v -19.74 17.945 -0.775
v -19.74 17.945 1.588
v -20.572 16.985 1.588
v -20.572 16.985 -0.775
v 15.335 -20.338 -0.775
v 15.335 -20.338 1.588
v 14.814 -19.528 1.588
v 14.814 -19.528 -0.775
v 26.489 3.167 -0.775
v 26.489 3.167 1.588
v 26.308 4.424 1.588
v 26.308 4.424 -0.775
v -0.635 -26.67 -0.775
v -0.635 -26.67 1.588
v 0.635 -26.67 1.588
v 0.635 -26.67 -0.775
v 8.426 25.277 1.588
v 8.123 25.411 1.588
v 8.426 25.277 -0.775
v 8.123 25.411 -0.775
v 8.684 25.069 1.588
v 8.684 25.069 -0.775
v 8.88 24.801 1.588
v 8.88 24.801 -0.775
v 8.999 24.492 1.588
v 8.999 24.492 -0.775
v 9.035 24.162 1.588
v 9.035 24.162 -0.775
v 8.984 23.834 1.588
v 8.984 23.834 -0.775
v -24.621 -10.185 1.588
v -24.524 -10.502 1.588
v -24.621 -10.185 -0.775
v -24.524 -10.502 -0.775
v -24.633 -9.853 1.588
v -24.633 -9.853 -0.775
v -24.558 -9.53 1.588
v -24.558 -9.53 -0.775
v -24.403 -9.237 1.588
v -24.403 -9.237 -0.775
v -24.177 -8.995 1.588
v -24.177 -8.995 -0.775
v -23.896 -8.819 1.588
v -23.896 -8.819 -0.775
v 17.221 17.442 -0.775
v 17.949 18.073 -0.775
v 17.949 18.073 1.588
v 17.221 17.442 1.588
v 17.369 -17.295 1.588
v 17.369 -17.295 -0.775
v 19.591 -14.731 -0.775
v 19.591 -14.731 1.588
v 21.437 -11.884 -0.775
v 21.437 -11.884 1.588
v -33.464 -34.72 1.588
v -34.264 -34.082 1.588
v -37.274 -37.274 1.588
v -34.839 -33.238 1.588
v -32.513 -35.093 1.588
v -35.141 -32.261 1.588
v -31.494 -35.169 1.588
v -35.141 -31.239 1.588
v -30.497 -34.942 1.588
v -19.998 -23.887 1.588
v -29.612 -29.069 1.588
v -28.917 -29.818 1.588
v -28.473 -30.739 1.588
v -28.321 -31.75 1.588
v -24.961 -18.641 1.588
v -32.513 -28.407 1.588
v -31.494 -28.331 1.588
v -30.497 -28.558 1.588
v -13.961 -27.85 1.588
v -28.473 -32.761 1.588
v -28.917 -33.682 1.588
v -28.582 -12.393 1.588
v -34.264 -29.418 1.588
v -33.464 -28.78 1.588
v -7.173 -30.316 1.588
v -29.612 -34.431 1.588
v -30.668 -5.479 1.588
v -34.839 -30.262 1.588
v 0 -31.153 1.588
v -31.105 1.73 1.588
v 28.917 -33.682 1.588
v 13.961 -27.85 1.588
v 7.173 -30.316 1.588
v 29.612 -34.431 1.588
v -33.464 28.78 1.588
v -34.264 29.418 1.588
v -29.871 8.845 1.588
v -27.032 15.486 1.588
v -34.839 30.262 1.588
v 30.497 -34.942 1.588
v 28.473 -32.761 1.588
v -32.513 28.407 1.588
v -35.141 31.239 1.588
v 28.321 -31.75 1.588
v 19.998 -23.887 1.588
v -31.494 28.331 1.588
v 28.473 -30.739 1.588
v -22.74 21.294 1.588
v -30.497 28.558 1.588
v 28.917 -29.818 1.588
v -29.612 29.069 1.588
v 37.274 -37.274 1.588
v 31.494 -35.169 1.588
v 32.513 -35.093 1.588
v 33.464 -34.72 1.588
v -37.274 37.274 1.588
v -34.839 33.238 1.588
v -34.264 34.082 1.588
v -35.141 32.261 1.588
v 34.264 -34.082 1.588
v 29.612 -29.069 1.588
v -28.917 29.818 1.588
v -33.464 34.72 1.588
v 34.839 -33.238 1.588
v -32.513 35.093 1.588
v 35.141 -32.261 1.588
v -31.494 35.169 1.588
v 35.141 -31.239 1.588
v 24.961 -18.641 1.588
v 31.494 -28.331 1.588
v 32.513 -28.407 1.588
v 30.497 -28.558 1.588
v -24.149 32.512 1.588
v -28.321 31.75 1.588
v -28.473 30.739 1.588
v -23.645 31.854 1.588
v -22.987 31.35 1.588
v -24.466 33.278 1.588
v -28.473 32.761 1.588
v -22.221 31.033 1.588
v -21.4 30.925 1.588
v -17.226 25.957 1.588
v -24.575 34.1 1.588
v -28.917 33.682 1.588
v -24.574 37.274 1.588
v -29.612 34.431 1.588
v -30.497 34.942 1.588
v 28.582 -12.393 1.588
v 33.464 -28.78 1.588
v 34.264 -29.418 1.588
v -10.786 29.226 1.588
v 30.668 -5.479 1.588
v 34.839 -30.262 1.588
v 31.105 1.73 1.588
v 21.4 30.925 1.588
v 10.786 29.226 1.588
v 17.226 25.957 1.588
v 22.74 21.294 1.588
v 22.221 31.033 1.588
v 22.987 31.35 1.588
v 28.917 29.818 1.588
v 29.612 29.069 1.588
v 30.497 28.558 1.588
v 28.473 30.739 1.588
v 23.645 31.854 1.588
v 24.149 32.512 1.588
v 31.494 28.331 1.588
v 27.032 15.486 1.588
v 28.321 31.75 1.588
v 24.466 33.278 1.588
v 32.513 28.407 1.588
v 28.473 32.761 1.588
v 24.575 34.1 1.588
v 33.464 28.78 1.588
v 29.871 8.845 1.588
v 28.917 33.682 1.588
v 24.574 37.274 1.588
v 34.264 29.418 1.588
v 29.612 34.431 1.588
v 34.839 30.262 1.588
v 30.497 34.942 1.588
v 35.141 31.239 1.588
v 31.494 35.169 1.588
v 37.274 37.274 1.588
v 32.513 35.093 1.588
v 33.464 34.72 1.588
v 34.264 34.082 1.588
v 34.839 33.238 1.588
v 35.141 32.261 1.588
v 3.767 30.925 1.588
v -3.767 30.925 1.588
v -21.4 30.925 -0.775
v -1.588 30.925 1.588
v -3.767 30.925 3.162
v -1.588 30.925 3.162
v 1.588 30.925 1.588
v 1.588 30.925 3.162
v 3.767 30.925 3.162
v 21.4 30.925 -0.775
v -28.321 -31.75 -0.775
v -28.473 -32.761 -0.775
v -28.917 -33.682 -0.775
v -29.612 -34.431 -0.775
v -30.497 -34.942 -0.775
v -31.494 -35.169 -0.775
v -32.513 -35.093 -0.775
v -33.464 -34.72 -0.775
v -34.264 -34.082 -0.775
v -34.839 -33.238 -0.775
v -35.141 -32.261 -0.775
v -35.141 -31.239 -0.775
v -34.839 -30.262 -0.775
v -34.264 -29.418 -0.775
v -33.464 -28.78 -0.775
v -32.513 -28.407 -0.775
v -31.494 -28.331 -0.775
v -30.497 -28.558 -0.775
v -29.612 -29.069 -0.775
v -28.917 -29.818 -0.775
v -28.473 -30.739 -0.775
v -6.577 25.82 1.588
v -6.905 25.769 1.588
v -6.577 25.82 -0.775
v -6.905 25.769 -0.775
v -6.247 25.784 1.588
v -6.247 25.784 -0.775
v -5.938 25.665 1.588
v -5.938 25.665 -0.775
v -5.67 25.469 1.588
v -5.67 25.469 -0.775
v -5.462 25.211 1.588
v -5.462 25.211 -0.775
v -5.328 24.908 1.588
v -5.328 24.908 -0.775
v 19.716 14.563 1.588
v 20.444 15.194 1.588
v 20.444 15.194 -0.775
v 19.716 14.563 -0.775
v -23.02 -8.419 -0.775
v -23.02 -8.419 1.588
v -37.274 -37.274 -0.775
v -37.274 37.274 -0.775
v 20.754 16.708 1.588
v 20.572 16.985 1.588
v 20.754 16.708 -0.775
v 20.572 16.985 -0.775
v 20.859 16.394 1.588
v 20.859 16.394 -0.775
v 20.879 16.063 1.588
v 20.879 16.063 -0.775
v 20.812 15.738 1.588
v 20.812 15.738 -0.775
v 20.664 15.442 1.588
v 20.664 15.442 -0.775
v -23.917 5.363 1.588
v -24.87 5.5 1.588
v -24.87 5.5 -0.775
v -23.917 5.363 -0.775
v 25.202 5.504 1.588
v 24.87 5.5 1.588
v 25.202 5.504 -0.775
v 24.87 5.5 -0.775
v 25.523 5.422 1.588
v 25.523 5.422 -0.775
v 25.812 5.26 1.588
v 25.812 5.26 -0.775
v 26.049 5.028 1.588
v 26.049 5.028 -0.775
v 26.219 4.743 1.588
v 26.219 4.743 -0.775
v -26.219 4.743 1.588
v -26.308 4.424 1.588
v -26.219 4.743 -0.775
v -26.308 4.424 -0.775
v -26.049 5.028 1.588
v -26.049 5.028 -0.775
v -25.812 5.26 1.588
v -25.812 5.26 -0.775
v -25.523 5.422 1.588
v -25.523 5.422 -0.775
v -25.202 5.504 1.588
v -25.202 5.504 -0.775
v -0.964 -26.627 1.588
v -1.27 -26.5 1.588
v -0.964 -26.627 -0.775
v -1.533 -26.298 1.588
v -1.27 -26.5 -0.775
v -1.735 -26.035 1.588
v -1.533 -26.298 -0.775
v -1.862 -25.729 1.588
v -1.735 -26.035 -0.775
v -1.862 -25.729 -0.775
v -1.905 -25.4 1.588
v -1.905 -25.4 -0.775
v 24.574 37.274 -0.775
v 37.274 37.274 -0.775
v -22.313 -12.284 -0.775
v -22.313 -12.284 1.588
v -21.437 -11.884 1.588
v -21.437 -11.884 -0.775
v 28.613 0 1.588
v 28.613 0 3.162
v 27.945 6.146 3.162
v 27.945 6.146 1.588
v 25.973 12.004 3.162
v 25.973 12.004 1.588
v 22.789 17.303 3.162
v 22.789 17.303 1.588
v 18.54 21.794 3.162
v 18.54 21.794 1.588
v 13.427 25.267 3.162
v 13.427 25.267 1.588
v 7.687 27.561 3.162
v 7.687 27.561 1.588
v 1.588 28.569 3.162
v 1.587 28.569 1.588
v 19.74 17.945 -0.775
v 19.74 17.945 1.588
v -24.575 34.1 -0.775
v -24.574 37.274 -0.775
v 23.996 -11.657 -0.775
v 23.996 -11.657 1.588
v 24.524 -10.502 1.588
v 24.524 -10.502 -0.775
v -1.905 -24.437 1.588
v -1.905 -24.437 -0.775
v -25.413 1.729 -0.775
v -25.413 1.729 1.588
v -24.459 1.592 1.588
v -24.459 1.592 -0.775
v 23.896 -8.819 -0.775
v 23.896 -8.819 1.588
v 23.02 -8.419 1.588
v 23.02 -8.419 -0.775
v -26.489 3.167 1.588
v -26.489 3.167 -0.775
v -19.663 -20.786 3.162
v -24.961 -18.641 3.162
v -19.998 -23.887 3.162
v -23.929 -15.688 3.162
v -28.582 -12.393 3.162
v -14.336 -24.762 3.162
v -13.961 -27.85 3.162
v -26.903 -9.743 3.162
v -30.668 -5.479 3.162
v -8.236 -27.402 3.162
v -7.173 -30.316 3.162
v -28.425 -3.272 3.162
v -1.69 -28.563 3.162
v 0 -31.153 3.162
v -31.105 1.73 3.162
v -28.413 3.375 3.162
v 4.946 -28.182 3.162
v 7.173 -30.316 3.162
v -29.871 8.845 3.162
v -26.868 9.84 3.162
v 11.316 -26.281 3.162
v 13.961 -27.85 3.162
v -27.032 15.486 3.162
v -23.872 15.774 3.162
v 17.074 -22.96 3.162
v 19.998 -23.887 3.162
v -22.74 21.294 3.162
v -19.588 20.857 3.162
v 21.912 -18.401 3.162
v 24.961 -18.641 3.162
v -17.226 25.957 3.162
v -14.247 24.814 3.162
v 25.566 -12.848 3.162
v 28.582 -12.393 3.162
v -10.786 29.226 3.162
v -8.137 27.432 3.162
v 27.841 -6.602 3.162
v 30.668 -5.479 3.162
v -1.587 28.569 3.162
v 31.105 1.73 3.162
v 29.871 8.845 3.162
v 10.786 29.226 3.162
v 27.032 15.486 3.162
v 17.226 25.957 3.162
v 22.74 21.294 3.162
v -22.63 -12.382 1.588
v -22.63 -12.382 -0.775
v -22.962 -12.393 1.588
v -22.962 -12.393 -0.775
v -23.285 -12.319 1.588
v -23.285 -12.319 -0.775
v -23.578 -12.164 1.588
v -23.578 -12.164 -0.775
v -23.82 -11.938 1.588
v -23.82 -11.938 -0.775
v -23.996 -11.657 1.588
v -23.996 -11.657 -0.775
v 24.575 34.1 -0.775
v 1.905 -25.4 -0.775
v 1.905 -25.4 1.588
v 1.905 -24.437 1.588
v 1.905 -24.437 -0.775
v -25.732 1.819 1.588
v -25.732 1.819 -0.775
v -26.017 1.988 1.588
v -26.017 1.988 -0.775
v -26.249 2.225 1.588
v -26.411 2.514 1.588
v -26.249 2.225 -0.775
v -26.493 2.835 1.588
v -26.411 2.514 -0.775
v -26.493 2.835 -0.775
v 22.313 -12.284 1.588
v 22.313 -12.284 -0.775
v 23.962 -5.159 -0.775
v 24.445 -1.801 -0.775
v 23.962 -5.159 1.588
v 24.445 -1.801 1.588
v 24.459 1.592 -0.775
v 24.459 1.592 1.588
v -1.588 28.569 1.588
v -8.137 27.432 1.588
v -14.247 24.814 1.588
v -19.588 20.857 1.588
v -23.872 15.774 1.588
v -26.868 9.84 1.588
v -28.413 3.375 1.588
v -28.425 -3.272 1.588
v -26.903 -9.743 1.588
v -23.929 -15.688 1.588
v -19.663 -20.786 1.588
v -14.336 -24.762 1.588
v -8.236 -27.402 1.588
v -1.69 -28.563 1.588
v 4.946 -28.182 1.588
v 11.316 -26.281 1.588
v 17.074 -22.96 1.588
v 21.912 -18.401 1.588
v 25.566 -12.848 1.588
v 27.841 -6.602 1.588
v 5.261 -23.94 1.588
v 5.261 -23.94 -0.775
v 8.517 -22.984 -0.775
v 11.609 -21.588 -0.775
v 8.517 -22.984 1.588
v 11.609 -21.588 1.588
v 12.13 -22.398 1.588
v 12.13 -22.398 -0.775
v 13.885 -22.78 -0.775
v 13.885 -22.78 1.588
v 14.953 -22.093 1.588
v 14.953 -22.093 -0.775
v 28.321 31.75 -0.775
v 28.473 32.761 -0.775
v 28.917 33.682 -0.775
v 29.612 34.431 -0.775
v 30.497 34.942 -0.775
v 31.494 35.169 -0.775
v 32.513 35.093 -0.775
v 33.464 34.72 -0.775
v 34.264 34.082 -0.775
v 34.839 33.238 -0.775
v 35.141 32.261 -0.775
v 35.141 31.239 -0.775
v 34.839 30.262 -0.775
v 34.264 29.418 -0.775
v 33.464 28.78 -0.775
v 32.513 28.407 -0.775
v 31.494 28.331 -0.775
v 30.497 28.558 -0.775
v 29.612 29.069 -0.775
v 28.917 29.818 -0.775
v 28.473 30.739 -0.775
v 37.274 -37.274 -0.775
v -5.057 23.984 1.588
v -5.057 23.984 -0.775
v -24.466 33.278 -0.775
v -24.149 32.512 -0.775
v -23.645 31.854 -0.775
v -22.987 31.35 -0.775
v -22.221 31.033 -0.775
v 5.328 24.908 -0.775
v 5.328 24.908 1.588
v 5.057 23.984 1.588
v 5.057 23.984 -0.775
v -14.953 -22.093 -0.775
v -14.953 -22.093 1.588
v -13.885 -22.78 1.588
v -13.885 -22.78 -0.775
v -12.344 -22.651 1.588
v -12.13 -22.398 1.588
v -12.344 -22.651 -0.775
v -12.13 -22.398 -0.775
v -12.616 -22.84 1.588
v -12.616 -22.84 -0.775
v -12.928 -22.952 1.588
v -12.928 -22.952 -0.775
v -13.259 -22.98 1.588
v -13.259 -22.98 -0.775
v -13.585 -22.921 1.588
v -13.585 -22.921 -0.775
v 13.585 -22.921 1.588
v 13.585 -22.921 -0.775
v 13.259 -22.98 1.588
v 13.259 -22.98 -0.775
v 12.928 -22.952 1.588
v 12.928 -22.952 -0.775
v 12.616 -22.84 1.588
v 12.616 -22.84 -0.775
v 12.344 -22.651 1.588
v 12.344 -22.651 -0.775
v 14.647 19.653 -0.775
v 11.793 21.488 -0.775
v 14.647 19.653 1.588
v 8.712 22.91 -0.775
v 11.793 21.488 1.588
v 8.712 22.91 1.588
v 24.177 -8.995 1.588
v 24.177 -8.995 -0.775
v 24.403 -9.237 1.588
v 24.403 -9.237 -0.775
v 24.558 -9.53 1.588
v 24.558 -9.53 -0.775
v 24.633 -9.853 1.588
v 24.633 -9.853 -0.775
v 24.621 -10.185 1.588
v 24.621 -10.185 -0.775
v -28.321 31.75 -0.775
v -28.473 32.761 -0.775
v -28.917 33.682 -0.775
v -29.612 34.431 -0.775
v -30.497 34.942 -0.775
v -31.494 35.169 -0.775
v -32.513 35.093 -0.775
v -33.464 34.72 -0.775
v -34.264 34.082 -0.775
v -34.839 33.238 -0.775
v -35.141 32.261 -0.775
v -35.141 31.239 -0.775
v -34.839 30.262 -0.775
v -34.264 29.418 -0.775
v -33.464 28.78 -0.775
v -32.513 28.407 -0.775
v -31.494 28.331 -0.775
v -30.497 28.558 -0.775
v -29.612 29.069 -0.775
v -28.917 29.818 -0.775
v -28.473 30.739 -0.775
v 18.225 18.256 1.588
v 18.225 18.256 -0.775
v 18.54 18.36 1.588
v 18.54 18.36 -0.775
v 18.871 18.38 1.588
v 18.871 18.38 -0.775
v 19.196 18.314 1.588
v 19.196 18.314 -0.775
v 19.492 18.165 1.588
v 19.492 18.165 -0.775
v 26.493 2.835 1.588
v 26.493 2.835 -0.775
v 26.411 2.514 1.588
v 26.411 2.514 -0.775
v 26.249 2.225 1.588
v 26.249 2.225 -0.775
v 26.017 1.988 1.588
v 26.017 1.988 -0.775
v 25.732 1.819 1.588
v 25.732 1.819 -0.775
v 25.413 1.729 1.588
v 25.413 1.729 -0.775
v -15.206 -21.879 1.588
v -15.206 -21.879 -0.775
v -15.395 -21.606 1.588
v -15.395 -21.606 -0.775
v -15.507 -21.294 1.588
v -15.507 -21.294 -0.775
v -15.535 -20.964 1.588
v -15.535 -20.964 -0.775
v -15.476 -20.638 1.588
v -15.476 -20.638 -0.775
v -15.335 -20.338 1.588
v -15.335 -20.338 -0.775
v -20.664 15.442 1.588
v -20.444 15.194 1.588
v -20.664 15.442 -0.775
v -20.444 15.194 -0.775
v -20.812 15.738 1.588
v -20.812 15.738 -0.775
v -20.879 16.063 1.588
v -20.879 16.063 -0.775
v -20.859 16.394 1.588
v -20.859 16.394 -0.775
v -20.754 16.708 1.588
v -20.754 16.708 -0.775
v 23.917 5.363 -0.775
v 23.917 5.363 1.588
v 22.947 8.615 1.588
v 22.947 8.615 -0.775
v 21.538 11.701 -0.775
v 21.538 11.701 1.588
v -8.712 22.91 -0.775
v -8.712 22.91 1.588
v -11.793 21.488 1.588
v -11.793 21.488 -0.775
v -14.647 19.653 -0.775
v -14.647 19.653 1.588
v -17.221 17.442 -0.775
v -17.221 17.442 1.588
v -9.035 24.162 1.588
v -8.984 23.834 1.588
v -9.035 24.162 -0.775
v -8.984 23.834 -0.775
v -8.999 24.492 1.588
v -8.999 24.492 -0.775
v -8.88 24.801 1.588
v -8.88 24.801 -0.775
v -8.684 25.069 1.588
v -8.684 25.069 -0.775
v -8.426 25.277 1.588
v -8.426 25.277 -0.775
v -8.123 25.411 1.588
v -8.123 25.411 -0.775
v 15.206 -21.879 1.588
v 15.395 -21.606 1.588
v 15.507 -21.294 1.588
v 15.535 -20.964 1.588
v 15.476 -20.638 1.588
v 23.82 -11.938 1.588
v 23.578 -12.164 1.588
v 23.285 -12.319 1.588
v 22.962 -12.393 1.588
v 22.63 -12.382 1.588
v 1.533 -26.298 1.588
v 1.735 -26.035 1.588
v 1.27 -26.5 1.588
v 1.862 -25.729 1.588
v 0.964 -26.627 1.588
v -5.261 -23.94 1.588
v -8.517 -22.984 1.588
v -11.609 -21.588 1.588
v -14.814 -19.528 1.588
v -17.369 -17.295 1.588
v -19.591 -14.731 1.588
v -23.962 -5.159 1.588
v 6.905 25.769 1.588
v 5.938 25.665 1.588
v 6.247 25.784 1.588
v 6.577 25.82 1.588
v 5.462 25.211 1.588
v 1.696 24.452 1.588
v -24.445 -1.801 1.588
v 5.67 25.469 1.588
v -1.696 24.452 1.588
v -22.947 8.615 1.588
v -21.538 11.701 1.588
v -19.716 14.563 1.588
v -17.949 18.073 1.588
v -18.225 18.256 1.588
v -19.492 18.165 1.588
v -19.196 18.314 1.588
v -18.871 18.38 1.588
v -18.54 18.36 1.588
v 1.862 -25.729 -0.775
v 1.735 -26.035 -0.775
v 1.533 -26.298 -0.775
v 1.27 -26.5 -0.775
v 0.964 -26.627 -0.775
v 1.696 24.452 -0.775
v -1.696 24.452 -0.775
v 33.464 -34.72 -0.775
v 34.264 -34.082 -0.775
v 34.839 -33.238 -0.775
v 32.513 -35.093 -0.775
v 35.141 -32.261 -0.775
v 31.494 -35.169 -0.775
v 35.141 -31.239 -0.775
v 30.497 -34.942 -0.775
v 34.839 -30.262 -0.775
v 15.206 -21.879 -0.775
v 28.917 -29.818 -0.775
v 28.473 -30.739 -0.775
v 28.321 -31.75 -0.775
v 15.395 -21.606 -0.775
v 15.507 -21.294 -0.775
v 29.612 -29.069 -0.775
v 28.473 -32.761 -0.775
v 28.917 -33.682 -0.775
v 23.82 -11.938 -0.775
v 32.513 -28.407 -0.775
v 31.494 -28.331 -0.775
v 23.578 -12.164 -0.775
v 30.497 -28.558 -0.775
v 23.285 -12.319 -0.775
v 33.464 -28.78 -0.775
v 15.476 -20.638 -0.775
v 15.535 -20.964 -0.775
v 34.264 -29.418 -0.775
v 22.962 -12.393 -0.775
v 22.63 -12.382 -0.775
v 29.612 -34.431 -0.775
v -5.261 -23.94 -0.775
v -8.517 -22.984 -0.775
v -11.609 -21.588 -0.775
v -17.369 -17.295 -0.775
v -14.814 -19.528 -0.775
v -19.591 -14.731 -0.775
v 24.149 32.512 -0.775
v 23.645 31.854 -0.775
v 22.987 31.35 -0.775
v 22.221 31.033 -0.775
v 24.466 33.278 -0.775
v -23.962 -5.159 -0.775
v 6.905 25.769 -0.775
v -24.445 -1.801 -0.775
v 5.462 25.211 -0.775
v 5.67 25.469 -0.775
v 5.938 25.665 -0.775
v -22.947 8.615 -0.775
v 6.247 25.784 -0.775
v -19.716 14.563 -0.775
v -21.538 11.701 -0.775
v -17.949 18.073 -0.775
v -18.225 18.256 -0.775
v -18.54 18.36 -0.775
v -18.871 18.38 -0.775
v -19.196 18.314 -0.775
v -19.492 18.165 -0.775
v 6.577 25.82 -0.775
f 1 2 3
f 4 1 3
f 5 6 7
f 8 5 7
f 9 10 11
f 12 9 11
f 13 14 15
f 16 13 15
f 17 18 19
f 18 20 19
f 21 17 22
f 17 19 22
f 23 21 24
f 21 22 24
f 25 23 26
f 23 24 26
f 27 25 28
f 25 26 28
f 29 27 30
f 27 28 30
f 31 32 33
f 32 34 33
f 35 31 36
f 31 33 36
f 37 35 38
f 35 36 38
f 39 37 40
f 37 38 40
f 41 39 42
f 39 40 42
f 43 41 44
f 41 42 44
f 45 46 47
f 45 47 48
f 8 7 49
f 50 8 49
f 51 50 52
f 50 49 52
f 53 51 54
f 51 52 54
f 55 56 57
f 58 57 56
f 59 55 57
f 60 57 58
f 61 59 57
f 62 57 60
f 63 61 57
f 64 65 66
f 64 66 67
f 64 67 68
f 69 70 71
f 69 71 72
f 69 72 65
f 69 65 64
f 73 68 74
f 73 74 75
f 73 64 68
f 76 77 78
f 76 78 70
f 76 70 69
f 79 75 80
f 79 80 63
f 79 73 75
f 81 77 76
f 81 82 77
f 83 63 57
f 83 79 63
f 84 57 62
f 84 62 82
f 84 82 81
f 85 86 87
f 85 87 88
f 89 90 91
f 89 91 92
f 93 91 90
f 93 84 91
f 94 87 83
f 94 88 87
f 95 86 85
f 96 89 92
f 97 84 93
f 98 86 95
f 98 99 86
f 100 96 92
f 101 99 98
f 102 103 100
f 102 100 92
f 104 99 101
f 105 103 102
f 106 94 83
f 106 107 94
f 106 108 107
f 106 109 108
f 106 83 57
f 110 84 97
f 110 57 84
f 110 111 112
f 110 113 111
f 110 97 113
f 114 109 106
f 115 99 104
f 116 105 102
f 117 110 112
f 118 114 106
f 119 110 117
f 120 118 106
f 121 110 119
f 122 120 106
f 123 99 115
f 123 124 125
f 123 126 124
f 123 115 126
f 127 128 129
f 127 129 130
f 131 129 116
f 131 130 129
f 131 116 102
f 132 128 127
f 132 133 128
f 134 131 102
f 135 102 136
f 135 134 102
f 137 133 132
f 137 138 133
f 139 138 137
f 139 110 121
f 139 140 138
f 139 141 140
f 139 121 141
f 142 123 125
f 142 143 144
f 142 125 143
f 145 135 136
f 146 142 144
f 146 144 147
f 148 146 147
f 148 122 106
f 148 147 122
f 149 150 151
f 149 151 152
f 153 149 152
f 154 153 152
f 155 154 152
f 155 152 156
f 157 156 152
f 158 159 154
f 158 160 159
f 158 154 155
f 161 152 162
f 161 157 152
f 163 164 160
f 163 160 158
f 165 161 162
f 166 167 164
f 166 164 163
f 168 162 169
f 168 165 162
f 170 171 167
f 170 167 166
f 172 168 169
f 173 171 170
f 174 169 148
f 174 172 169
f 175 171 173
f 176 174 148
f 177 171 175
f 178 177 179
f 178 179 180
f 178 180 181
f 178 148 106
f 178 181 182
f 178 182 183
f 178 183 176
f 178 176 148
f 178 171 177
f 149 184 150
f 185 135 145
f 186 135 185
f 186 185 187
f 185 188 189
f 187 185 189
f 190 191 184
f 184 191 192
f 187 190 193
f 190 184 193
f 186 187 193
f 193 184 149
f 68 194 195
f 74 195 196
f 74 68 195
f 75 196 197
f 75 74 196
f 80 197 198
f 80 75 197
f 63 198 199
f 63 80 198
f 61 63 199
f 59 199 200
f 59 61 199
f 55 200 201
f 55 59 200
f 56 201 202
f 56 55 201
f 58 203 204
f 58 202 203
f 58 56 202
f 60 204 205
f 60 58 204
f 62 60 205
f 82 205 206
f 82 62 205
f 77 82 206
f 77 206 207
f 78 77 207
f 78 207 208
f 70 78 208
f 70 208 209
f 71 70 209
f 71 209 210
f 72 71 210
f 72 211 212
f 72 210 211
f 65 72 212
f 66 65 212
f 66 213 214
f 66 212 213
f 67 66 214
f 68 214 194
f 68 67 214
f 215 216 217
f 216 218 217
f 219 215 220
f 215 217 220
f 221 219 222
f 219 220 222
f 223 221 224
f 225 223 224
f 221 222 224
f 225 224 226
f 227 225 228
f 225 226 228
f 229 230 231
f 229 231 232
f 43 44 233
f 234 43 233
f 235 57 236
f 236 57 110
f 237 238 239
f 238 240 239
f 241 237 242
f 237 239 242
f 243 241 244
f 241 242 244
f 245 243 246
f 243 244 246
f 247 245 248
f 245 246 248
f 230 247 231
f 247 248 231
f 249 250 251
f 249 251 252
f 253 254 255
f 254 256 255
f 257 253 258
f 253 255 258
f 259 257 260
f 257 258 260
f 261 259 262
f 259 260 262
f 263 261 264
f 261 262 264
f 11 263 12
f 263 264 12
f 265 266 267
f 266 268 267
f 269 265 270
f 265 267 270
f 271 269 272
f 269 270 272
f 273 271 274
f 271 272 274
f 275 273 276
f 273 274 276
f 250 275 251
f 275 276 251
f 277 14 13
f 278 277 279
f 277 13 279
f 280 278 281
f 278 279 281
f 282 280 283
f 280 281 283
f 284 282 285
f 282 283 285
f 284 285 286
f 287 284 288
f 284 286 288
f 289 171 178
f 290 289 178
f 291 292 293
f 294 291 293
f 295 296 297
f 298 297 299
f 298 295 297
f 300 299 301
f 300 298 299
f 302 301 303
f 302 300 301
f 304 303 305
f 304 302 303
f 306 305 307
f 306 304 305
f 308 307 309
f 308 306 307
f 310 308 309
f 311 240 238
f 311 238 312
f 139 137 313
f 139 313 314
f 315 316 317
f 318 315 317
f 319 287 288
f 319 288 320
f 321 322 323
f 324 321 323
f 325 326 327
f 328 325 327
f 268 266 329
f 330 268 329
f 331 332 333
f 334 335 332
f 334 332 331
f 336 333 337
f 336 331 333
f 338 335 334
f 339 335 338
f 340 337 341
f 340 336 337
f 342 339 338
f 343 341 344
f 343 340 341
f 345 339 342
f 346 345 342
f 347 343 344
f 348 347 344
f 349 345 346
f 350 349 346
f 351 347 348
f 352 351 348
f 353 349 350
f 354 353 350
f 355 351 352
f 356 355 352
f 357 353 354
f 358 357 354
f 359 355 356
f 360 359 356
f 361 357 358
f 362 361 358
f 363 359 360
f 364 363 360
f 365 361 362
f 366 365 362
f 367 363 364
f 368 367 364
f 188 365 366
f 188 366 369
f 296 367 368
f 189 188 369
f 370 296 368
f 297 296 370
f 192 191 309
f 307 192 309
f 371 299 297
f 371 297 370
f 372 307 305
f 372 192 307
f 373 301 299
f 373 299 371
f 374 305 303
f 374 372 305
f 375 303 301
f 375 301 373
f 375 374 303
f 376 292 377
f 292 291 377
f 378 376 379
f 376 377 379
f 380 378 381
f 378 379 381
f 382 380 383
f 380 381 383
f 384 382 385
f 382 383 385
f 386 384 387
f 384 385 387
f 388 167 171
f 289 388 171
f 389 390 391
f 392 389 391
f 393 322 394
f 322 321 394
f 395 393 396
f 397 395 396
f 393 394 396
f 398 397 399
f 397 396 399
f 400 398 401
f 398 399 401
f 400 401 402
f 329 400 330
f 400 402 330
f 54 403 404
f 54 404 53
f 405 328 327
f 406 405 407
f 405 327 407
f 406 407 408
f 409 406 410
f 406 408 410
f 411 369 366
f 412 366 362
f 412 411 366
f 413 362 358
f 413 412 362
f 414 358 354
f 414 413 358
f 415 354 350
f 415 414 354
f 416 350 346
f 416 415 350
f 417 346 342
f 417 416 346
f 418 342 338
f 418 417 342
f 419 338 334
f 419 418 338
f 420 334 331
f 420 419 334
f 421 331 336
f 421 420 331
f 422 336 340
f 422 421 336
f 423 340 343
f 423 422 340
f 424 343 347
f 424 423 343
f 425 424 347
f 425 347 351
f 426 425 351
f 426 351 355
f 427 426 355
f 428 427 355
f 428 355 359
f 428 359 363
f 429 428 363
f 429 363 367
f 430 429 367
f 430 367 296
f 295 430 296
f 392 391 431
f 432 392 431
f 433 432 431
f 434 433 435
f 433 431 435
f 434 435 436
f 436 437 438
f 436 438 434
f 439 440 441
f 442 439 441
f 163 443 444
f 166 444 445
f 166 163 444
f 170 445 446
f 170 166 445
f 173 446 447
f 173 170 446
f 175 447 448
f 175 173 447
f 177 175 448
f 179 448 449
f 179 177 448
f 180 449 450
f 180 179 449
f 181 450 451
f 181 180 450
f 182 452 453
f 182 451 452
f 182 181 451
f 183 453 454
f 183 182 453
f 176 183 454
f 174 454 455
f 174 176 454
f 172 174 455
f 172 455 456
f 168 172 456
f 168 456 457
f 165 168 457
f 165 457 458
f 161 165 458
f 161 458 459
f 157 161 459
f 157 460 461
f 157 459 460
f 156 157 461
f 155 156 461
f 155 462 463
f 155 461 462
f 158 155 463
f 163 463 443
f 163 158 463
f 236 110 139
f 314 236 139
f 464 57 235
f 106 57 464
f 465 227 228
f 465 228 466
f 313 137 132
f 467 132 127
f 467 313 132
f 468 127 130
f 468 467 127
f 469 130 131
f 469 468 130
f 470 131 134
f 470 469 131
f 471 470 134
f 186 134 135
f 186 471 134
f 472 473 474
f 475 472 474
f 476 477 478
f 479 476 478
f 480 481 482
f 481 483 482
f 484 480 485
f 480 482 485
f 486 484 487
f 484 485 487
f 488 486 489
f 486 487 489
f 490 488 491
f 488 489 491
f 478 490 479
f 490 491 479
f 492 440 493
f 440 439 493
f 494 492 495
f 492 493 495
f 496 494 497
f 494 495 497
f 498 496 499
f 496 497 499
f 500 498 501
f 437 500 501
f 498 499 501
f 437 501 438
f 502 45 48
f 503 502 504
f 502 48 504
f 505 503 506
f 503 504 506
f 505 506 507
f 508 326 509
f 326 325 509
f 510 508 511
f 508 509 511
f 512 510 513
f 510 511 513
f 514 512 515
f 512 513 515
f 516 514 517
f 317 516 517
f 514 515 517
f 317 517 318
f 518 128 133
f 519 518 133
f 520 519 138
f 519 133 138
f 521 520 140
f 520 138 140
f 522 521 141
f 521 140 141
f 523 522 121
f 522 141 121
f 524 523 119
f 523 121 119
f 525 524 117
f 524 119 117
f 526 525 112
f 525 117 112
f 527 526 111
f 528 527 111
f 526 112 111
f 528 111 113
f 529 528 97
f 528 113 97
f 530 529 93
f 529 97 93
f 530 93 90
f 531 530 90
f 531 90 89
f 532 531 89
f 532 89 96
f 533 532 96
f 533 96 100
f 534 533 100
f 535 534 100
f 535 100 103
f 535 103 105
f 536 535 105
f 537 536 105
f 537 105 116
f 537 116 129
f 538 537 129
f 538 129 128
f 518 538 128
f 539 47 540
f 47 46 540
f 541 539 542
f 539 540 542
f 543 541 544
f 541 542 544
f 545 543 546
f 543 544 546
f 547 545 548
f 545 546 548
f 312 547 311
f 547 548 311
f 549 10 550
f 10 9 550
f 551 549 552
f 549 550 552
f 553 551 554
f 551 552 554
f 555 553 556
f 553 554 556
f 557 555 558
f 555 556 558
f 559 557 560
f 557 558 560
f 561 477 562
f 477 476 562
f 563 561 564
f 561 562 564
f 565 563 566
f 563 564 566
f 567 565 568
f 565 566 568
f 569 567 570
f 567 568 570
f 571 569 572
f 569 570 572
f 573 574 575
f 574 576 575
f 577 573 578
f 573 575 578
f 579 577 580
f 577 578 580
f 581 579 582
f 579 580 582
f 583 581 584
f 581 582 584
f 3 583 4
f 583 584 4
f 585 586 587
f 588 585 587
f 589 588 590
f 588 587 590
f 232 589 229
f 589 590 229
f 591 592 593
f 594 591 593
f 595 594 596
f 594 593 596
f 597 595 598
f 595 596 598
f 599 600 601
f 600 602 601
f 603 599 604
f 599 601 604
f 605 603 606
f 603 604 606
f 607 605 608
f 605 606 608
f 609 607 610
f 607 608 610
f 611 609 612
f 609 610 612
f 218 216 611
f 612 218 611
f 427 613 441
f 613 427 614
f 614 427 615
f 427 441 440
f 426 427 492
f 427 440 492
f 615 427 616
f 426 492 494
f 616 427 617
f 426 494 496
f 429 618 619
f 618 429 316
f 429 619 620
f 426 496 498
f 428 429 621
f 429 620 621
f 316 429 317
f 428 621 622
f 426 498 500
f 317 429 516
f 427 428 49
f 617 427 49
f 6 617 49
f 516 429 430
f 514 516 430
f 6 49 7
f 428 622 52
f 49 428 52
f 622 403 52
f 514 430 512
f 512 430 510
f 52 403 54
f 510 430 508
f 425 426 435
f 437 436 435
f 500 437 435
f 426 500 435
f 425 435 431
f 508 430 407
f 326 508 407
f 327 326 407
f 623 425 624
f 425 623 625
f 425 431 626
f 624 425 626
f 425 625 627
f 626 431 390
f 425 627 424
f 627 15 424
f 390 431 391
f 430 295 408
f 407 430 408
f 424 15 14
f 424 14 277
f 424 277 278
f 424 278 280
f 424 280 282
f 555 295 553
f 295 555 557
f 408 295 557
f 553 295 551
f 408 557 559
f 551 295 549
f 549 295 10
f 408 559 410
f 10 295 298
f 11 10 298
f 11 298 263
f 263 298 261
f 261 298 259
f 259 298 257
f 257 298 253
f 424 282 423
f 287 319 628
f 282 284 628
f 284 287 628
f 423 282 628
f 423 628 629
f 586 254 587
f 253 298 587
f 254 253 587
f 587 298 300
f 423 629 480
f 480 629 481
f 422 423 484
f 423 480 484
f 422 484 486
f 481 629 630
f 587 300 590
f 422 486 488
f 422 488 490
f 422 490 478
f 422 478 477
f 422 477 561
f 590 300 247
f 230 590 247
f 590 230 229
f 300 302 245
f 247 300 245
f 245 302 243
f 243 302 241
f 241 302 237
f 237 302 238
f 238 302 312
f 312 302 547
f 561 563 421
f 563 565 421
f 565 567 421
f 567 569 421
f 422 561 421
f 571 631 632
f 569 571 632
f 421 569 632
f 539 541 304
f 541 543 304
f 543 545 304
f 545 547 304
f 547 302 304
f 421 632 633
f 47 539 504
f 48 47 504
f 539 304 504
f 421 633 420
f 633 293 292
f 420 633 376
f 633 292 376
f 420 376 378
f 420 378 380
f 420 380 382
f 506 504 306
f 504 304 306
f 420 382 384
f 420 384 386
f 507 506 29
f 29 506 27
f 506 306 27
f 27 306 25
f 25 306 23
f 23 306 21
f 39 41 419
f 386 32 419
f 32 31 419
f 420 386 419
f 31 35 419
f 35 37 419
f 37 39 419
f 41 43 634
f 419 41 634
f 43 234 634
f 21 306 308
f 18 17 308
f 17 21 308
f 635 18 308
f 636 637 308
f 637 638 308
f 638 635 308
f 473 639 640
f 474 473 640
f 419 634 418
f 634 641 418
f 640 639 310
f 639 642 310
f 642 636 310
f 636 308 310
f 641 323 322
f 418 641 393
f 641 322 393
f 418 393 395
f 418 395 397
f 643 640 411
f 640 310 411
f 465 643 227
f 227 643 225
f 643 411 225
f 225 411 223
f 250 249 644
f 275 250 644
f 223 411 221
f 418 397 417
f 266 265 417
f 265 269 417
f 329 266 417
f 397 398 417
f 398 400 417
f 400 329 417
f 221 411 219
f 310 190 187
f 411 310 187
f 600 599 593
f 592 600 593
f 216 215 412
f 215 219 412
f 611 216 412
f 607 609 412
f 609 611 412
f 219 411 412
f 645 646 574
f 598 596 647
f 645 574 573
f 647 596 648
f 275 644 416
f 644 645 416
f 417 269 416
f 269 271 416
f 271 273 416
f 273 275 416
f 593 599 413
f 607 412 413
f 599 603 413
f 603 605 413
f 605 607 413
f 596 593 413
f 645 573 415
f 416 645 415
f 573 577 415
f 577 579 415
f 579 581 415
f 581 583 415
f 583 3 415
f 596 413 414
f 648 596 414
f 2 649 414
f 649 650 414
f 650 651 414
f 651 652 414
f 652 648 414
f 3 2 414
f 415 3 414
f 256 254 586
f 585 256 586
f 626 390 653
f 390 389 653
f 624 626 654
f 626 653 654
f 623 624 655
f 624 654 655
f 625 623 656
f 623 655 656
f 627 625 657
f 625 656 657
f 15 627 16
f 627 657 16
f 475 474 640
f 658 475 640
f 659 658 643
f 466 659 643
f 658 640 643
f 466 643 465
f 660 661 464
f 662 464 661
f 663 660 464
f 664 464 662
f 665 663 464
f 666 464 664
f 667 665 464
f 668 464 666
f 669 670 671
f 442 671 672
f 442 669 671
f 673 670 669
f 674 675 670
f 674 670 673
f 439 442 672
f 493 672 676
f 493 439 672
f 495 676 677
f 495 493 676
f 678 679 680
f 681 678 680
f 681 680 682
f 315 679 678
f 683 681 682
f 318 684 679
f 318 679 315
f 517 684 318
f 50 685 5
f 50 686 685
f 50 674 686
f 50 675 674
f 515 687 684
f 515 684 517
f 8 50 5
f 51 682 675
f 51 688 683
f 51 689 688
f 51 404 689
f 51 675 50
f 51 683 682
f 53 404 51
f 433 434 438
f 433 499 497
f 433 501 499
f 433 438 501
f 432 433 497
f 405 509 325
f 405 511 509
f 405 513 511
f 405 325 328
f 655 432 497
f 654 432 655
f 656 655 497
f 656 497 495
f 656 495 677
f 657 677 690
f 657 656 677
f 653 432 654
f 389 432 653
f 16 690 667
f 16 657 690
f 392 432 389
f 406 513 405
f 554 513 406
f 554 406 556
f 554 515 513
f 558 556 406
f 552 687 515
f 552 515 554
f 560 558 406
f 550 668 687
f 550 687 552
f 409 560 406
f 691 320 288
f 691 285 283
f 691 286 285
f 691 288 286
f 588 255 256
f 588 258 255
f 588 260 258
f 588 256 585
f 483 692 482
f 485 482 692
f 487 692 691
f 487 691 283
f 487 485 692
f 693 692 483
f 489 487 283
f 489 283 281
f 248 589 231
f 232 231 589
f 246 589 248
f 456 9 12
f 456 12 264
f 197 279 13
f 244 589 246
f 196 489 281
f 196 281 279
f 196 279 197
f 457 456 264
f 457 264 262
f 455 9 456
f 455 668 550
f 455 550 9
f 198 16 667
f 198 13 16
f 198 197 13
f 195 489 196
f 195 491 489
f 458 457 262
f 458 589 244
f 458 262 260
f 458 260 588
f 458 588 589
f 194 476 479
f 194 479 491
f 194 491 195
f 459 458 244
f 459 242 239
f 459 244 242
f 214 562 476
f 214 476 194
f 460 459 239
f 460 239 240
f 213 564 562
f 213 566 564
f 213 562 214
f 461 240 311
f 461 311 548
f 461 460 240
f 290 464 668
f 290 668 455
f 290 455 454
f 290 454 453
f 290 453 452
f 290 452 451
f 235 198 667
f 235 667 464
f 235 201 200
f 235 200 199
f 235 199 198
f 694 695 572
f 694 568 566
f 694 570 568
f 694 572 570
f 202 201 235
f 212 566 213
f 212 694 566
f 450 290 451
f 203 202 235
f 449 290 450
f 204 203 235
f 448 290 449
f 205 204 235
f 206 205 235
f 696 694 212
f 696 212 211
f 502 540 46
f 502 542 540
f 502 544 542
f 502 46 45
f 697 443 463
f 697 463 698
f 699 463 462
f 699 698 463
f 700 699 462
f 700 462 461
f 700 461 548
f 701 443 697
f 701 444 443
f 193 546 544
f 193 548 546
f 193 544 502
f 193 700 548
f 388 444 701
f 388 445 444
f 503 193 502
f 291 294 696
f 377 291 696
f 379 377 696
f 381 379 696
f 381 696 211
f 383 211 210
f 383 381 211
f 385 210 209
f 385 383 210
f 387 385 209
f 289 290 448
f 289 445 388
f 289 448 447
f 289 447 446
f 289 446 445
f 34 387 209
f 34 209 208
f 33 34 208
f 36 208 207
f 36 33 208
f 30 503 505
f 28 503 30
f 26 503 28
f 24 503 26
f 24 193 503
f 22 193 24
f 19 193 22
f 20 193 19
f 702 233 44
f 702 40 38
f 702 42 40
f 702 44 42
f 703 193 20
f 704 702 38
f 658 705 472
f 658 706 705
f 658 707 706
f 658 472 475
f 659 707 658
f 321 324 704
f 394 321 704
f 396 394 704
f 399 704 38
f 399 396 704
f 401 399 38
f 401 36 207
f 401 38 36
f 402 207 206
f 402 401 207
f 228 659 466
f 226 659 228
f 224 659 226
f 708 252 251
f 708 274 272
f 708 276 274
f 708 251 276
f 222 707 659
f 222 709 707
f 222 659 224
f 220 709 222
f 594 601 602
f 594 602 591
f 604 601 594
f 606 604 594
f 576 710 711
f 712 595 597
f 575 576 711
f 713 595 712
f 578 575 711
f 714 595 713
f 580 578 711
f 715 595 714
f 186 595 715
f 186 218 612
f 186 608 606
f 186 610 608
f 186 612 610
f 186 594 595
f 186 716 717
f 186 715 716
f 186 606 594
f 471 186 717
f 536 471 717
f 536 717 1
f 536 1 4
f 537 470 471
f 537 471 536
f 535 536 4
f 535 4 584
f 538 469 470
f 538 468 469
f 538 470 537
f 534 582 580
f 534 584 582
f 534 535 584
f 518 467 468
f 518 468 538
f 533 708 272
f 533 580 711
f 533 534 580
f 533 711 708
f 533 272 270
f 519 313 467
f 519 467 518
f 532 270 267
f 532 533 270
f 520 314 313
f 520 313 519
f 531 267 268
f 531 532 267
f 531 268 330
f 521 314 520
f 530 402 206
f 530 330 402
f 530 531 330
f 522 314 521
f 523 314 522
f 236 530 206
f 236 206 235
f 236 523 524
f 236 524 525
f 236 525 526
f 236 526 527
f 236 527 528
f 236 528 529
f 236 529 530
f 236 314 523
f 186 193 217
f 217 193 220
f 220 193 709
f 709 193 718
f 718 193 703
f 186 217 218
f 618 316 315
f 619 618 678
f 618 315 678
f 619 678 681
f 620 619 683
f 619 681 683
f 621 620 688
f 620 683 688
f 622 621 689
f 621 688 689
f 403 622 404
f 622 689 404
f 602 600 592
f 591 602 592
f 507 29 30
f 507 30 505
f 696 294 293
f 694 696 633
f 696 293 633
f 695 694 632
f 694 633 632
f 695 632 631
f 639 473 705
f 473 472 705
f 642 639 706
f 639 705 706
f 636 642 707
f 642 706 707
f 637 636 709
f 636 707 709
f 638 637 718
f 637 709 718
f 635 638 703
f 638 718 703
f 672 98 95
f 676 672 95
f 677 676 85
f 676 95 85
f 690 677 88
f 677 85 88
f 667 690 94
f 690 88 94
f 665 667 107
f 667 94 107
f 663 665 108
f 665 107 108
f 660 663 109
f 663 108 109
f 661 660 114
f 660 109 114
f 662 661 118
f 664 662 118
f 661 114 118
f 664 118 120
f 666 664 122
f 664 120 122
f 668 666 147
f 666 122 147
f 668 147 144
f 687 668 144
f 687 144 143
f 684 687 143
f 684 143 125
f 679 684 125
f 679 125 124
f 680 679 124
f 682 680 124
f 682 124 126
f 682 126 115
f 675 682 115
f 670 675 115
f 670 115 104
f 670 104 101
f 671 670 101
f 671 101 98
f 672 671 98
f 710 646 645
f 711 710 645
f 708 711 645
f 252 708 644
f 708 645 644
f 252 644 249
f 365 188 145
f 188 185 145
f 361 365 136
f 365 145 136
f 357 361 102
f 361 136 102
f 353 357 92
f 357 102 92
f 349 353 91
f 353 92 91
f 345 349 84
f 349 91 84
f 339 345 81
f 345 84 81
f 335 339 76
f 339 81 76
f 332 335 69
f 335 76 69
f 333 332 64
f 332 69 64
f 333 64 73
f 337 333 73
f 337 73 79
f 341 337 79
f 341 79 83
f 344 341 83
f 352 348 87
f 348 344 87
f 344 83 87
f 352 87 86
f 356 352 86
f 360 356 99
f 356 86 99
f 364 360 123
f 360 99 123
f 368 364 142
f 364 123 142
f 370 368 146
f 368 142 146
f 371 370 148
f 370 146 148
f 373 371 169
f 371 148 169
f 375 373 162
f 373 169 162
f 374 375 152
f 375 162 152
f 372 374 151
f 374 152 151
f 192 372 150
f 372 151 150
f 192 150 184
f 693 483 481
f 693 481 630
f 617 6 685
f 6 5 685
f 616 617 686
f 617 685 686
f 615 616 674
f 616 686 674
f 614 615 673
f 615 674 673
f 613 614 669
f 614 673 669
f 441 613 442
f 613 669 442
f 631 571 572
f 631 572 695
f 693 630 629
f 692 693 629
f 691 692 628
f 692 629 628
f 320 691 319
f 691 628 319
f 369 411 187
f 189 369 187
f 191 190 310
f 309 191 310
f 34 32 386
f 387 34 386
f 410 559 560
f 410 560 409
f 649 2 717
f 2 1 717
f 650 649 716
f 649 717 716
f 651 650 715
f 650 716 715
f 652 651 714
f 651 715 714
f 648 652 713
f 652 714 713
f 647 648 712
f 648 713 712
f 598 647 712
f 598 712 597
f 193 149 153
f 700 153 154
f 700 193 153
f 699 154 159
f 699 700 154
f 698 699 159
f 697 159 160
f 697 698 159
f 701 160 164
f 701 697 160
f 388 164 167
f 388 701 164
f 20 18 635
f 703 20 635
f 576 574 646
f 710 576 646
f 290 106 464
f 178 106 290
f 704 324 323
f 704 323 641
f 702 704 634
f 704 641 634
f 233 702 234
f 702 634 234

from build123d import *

# Parameters (mm, degrees)
SKETCH1_W                = 74.549
SKETCH1_H                = 74.549
SKETCH1_R                = 24.511
BOSS_EXTRUDE1_DEPTH      = 1.5875
BOSS_EXTRUDE1_DEPTH_BACK = 1.5875
SKETCH2_R                = 3.429
CUT_EXTRUDE1_DEPTH       = 4.175
MIRROR2_COPY_1_SKETCH_R  = 3.429
MIRROR2_COPY_1_DEPTH     = 4.175
SKETCH15_R               = 31.1531
SKETCH15_R_2             = 28.6131
BOSS_EXTRUDE11_DEPTH     = 1.5748
SKETCH14_W               = 49.149
SKETCH14_H               = 8.290530285
CUT_EXTRUDE6_DEPTH       = 2.5748
CUT_EXTRUDE6_DEPTH_BACK  = 4.175
FILLET2_R                = 3.175
CUT_EXTRUDE8_REACH       = 3.575
SKETCH18_W               = 74.549
SKETCH18_H               = 74.549
CUT_EXTRUDE9_DEPTH       = 0.8128
SKETCH19_W               = 3.81
SKETCH19_H               = 6.35
CUT_EXTRUDE10_DEPTH      = 3.3622
FILLET3_R                = 1.27
CIRPATTERN2_COUNT        = 11
FILLET3_OF_CIRPATTERN2_R = 1.27


with BuildPart() as part:
    # Sketch1 → Boss-Extrude1 (new body, two sides)
    with BuildSketch(Plane.XY) as boss_extrude1_sk:
        Rectangle(SKETCH1_W, SKETCH1_H)
        Circle(SKETCH1_R, mode=Mode.SUBTRACT)
    extrude(amount=BOSS_EXTRUDE1_DEPTH)
    extrude(boss_extrude1_sk.sketch, amount=-BOSS_EXTRUDE1_DEPTH_BACK)

    # Sketch2 → Cut-Extrude1 (cut, through all)
    with BuildSketch(Plane.XY.offset(1.5875)):
        with Locations((-31.75, 31.75)):
            Circle(SKETCH2_R)
    cut_extrude1 = extrude(amount=-CUT_EXTRUDE1_DEPTH, mode=Mode.SUBTRACT)

    # Mirror1: Cut-Extrude1 across plane
    add(cut_extrude1.mirror(Plane(origin=(0, 0, 0), x_dir=(0, 0, 1), z_dir=(1, 0, 0))), mode=Mode.SUBTRACT)

    # Mirror2: Cut-Extrude1 across plane
    add(cut_extrude1.mirror(Plane.ZX), mode=Mode.SUBTRACT)

    # Mirror2 copy 1 sketch → Mirror2 copy 1 (cut, through all)
    with BuildSketch(Plane(origin=(0, 0, 1.5875), x_dir=(-1, 0, 0), z_dir=(0, 0, 1))):
        with Locations((-31.75, 31.75)):
            Circle(MIRROR2_COPY_1_SKETCH_R)
    extrude(amount=-MIRROR2_COPY_1_DEPTH, mode=Mode.SUBTRACT)

    # Sketch15 → Boss-Extrude11 (add)
    with BuildSketch(Plane.XY.offset(1.5875)):
        Circle(SKETCH15_R)
        Circle(SKETCH15_R_2, mode=Mode.SUBTRACT)
    extrude(amount=BOSS_EXTRUDE11_DEPTH)

    # Sketch14 → Cut-Extrude6 (cut, two sides)
    with BuildSketch(Plane.XY.offset(1.5875)) as cut_extrude6_sk:
        with Locations((0, 35.069765143)):
            Rectangle(SKETCH14_W, SKETCH14_H)
    extrude(amount=CUT_EXTRUDE6_DEPTH, mode=Mode.SUBTRACT)
    extrude(cut_extrude6_sk.sketch, amount=-CUT_EXTRUDE6_DEPTH_BACK, mode=Mode.SUBTRACT)

    # Fillet2
    fillet2_edges = [part.edges().sort_by_distance(p)[0] for p in [
        (-24.5745, 30.9245, 0),
        (24.5745, 30.9245, 0),
    ]]
    fillet(fillet2_edges, radius=FILLET2_R)

    # Sketch17 → Cut-Extrude8 (cut, up to next)
    with BuildSketch(Plane.XY.offset(1.5875), mode=Mode.PRIVATE) as cut_extrude8_sk1:
        with BuildLine():
            Line((-1.5875, 24.754637718), (-1.5875, 33.858616052))
            ThreePointArc((-1.5875, 33.858616052), (0, 35.446116052), (1.5875, 33.858616052))
            Line((1.5875, 33.858616052), (1.5875, 24.754637718))
            ThreePointArc((1.5875, 24.754637718), (0, 23.167137718), (-1.5875, 24.754637718))
        make_face()
    cut_extrude8_tool1 = extrude(cut_extrude8_sk1.sketch, amount=CUT_EXTRUDE8_REACH, mode=Mode.PRIVATE) & part.part
    add(cut_extrude8_tool1.solids().sort_by_distance((0, 29.306627, 1.5875))[0], mode=Mode.SUBTRACT)

    # Sketch18 → Cut-Extrude9 (cut)
    with BuildSketch(Plane(origin=(0, 0, -1.5875), x_dir=(-1, 0, 0), z_dir=(0, 0, -1))):
        Rectangle(SKETCH18_W, SKETCH18_H)
    extrude(amount=-CUT_EXTRUDE9_DEPTH, mode=Mode.SUBTRACT)

    # Sketch19 → Cut-Extrude10 (cut, through all)
    with BuildSketch(Plane.XY.offset(1.5875)):
        with Locations((0, -23.495)):
            Rectangle(SKETCH19_W, SKETCH19_H)
    cut_extrude10 = extrude(amount=-CUT_EXTRUDE10_DEPTH, mode=Mode.SUBTRACT)

    # Fillet3
    fillet3_edges = [part.edges().sort_by_distance(p)[0] for p in [
        (-1.905, -26.67, 0.4064),
        (1.905, -26.67, 0.4064),
    ]]
    fillet(fillet3_edges, radius=FILLET3_R)

    # CirPattern2: Cut-Extrude10 ×11 about axis
    cirpattern2_axis = Axis((0, 0, 0), (0, 0, 1))
    for i in range(1, CIRPATTERN2_COUNT):
        add(cut_extrude10.rotate(cirpattern2_axis, i * 360 / CIRPATTERN2_COUNT), mode=Mode.SUBTRACT)

    # Fillet3 of CirPattern2
    fillet3_of_cirpattern2_edges = [part.edges().sort_by_distance(p)[0] for p in [
        (12.816302621, -23.466152478, 0.4064),
        (16.021478582, -21.406310963, 0.4064),
        (23.468519716, -12.811967348, 0.4064),
        (25.051250916, -9.346269446, 0.4064),
        (26.669647622, 1.90992689, 0.4064),
        (26.127428088, 5.681146584, 0.4064),
        (21.403350846, 16.025432835, 0.4064),
        (18.90833145, 18.904838713, 0.4064),
        (9.341641406, 25.052977086, 0.4064),
        (5.685973176, 26.126378127, 0.4064),
        (-5.685973176, 26.126378127, 0.4064),
        (-9.341641406, 25.052977086, 0.4064),
        (-18.90833145, 18.904838713, 0.4064),
        (-21.403350846, 16.025432835, 0.4064),
        (-26.127428088, 5.681146584, 0.4064),
        (-26.669647622, 1.90992689, 0.4064),
        (-25.051250916, -9.346269446, 0.4064),
        (-23.468519716, -12.811967348, 0.4064),
        (-16.021478582, -21.406310963, 0.4064),
        (-12.816302621, -23.466152478, 0.4064),
    ]]
    fillet(fillet3_of_cirpattern2_edges, radius=FILLET3_OF_CIRPATTERN2_R)


solid = part.part
